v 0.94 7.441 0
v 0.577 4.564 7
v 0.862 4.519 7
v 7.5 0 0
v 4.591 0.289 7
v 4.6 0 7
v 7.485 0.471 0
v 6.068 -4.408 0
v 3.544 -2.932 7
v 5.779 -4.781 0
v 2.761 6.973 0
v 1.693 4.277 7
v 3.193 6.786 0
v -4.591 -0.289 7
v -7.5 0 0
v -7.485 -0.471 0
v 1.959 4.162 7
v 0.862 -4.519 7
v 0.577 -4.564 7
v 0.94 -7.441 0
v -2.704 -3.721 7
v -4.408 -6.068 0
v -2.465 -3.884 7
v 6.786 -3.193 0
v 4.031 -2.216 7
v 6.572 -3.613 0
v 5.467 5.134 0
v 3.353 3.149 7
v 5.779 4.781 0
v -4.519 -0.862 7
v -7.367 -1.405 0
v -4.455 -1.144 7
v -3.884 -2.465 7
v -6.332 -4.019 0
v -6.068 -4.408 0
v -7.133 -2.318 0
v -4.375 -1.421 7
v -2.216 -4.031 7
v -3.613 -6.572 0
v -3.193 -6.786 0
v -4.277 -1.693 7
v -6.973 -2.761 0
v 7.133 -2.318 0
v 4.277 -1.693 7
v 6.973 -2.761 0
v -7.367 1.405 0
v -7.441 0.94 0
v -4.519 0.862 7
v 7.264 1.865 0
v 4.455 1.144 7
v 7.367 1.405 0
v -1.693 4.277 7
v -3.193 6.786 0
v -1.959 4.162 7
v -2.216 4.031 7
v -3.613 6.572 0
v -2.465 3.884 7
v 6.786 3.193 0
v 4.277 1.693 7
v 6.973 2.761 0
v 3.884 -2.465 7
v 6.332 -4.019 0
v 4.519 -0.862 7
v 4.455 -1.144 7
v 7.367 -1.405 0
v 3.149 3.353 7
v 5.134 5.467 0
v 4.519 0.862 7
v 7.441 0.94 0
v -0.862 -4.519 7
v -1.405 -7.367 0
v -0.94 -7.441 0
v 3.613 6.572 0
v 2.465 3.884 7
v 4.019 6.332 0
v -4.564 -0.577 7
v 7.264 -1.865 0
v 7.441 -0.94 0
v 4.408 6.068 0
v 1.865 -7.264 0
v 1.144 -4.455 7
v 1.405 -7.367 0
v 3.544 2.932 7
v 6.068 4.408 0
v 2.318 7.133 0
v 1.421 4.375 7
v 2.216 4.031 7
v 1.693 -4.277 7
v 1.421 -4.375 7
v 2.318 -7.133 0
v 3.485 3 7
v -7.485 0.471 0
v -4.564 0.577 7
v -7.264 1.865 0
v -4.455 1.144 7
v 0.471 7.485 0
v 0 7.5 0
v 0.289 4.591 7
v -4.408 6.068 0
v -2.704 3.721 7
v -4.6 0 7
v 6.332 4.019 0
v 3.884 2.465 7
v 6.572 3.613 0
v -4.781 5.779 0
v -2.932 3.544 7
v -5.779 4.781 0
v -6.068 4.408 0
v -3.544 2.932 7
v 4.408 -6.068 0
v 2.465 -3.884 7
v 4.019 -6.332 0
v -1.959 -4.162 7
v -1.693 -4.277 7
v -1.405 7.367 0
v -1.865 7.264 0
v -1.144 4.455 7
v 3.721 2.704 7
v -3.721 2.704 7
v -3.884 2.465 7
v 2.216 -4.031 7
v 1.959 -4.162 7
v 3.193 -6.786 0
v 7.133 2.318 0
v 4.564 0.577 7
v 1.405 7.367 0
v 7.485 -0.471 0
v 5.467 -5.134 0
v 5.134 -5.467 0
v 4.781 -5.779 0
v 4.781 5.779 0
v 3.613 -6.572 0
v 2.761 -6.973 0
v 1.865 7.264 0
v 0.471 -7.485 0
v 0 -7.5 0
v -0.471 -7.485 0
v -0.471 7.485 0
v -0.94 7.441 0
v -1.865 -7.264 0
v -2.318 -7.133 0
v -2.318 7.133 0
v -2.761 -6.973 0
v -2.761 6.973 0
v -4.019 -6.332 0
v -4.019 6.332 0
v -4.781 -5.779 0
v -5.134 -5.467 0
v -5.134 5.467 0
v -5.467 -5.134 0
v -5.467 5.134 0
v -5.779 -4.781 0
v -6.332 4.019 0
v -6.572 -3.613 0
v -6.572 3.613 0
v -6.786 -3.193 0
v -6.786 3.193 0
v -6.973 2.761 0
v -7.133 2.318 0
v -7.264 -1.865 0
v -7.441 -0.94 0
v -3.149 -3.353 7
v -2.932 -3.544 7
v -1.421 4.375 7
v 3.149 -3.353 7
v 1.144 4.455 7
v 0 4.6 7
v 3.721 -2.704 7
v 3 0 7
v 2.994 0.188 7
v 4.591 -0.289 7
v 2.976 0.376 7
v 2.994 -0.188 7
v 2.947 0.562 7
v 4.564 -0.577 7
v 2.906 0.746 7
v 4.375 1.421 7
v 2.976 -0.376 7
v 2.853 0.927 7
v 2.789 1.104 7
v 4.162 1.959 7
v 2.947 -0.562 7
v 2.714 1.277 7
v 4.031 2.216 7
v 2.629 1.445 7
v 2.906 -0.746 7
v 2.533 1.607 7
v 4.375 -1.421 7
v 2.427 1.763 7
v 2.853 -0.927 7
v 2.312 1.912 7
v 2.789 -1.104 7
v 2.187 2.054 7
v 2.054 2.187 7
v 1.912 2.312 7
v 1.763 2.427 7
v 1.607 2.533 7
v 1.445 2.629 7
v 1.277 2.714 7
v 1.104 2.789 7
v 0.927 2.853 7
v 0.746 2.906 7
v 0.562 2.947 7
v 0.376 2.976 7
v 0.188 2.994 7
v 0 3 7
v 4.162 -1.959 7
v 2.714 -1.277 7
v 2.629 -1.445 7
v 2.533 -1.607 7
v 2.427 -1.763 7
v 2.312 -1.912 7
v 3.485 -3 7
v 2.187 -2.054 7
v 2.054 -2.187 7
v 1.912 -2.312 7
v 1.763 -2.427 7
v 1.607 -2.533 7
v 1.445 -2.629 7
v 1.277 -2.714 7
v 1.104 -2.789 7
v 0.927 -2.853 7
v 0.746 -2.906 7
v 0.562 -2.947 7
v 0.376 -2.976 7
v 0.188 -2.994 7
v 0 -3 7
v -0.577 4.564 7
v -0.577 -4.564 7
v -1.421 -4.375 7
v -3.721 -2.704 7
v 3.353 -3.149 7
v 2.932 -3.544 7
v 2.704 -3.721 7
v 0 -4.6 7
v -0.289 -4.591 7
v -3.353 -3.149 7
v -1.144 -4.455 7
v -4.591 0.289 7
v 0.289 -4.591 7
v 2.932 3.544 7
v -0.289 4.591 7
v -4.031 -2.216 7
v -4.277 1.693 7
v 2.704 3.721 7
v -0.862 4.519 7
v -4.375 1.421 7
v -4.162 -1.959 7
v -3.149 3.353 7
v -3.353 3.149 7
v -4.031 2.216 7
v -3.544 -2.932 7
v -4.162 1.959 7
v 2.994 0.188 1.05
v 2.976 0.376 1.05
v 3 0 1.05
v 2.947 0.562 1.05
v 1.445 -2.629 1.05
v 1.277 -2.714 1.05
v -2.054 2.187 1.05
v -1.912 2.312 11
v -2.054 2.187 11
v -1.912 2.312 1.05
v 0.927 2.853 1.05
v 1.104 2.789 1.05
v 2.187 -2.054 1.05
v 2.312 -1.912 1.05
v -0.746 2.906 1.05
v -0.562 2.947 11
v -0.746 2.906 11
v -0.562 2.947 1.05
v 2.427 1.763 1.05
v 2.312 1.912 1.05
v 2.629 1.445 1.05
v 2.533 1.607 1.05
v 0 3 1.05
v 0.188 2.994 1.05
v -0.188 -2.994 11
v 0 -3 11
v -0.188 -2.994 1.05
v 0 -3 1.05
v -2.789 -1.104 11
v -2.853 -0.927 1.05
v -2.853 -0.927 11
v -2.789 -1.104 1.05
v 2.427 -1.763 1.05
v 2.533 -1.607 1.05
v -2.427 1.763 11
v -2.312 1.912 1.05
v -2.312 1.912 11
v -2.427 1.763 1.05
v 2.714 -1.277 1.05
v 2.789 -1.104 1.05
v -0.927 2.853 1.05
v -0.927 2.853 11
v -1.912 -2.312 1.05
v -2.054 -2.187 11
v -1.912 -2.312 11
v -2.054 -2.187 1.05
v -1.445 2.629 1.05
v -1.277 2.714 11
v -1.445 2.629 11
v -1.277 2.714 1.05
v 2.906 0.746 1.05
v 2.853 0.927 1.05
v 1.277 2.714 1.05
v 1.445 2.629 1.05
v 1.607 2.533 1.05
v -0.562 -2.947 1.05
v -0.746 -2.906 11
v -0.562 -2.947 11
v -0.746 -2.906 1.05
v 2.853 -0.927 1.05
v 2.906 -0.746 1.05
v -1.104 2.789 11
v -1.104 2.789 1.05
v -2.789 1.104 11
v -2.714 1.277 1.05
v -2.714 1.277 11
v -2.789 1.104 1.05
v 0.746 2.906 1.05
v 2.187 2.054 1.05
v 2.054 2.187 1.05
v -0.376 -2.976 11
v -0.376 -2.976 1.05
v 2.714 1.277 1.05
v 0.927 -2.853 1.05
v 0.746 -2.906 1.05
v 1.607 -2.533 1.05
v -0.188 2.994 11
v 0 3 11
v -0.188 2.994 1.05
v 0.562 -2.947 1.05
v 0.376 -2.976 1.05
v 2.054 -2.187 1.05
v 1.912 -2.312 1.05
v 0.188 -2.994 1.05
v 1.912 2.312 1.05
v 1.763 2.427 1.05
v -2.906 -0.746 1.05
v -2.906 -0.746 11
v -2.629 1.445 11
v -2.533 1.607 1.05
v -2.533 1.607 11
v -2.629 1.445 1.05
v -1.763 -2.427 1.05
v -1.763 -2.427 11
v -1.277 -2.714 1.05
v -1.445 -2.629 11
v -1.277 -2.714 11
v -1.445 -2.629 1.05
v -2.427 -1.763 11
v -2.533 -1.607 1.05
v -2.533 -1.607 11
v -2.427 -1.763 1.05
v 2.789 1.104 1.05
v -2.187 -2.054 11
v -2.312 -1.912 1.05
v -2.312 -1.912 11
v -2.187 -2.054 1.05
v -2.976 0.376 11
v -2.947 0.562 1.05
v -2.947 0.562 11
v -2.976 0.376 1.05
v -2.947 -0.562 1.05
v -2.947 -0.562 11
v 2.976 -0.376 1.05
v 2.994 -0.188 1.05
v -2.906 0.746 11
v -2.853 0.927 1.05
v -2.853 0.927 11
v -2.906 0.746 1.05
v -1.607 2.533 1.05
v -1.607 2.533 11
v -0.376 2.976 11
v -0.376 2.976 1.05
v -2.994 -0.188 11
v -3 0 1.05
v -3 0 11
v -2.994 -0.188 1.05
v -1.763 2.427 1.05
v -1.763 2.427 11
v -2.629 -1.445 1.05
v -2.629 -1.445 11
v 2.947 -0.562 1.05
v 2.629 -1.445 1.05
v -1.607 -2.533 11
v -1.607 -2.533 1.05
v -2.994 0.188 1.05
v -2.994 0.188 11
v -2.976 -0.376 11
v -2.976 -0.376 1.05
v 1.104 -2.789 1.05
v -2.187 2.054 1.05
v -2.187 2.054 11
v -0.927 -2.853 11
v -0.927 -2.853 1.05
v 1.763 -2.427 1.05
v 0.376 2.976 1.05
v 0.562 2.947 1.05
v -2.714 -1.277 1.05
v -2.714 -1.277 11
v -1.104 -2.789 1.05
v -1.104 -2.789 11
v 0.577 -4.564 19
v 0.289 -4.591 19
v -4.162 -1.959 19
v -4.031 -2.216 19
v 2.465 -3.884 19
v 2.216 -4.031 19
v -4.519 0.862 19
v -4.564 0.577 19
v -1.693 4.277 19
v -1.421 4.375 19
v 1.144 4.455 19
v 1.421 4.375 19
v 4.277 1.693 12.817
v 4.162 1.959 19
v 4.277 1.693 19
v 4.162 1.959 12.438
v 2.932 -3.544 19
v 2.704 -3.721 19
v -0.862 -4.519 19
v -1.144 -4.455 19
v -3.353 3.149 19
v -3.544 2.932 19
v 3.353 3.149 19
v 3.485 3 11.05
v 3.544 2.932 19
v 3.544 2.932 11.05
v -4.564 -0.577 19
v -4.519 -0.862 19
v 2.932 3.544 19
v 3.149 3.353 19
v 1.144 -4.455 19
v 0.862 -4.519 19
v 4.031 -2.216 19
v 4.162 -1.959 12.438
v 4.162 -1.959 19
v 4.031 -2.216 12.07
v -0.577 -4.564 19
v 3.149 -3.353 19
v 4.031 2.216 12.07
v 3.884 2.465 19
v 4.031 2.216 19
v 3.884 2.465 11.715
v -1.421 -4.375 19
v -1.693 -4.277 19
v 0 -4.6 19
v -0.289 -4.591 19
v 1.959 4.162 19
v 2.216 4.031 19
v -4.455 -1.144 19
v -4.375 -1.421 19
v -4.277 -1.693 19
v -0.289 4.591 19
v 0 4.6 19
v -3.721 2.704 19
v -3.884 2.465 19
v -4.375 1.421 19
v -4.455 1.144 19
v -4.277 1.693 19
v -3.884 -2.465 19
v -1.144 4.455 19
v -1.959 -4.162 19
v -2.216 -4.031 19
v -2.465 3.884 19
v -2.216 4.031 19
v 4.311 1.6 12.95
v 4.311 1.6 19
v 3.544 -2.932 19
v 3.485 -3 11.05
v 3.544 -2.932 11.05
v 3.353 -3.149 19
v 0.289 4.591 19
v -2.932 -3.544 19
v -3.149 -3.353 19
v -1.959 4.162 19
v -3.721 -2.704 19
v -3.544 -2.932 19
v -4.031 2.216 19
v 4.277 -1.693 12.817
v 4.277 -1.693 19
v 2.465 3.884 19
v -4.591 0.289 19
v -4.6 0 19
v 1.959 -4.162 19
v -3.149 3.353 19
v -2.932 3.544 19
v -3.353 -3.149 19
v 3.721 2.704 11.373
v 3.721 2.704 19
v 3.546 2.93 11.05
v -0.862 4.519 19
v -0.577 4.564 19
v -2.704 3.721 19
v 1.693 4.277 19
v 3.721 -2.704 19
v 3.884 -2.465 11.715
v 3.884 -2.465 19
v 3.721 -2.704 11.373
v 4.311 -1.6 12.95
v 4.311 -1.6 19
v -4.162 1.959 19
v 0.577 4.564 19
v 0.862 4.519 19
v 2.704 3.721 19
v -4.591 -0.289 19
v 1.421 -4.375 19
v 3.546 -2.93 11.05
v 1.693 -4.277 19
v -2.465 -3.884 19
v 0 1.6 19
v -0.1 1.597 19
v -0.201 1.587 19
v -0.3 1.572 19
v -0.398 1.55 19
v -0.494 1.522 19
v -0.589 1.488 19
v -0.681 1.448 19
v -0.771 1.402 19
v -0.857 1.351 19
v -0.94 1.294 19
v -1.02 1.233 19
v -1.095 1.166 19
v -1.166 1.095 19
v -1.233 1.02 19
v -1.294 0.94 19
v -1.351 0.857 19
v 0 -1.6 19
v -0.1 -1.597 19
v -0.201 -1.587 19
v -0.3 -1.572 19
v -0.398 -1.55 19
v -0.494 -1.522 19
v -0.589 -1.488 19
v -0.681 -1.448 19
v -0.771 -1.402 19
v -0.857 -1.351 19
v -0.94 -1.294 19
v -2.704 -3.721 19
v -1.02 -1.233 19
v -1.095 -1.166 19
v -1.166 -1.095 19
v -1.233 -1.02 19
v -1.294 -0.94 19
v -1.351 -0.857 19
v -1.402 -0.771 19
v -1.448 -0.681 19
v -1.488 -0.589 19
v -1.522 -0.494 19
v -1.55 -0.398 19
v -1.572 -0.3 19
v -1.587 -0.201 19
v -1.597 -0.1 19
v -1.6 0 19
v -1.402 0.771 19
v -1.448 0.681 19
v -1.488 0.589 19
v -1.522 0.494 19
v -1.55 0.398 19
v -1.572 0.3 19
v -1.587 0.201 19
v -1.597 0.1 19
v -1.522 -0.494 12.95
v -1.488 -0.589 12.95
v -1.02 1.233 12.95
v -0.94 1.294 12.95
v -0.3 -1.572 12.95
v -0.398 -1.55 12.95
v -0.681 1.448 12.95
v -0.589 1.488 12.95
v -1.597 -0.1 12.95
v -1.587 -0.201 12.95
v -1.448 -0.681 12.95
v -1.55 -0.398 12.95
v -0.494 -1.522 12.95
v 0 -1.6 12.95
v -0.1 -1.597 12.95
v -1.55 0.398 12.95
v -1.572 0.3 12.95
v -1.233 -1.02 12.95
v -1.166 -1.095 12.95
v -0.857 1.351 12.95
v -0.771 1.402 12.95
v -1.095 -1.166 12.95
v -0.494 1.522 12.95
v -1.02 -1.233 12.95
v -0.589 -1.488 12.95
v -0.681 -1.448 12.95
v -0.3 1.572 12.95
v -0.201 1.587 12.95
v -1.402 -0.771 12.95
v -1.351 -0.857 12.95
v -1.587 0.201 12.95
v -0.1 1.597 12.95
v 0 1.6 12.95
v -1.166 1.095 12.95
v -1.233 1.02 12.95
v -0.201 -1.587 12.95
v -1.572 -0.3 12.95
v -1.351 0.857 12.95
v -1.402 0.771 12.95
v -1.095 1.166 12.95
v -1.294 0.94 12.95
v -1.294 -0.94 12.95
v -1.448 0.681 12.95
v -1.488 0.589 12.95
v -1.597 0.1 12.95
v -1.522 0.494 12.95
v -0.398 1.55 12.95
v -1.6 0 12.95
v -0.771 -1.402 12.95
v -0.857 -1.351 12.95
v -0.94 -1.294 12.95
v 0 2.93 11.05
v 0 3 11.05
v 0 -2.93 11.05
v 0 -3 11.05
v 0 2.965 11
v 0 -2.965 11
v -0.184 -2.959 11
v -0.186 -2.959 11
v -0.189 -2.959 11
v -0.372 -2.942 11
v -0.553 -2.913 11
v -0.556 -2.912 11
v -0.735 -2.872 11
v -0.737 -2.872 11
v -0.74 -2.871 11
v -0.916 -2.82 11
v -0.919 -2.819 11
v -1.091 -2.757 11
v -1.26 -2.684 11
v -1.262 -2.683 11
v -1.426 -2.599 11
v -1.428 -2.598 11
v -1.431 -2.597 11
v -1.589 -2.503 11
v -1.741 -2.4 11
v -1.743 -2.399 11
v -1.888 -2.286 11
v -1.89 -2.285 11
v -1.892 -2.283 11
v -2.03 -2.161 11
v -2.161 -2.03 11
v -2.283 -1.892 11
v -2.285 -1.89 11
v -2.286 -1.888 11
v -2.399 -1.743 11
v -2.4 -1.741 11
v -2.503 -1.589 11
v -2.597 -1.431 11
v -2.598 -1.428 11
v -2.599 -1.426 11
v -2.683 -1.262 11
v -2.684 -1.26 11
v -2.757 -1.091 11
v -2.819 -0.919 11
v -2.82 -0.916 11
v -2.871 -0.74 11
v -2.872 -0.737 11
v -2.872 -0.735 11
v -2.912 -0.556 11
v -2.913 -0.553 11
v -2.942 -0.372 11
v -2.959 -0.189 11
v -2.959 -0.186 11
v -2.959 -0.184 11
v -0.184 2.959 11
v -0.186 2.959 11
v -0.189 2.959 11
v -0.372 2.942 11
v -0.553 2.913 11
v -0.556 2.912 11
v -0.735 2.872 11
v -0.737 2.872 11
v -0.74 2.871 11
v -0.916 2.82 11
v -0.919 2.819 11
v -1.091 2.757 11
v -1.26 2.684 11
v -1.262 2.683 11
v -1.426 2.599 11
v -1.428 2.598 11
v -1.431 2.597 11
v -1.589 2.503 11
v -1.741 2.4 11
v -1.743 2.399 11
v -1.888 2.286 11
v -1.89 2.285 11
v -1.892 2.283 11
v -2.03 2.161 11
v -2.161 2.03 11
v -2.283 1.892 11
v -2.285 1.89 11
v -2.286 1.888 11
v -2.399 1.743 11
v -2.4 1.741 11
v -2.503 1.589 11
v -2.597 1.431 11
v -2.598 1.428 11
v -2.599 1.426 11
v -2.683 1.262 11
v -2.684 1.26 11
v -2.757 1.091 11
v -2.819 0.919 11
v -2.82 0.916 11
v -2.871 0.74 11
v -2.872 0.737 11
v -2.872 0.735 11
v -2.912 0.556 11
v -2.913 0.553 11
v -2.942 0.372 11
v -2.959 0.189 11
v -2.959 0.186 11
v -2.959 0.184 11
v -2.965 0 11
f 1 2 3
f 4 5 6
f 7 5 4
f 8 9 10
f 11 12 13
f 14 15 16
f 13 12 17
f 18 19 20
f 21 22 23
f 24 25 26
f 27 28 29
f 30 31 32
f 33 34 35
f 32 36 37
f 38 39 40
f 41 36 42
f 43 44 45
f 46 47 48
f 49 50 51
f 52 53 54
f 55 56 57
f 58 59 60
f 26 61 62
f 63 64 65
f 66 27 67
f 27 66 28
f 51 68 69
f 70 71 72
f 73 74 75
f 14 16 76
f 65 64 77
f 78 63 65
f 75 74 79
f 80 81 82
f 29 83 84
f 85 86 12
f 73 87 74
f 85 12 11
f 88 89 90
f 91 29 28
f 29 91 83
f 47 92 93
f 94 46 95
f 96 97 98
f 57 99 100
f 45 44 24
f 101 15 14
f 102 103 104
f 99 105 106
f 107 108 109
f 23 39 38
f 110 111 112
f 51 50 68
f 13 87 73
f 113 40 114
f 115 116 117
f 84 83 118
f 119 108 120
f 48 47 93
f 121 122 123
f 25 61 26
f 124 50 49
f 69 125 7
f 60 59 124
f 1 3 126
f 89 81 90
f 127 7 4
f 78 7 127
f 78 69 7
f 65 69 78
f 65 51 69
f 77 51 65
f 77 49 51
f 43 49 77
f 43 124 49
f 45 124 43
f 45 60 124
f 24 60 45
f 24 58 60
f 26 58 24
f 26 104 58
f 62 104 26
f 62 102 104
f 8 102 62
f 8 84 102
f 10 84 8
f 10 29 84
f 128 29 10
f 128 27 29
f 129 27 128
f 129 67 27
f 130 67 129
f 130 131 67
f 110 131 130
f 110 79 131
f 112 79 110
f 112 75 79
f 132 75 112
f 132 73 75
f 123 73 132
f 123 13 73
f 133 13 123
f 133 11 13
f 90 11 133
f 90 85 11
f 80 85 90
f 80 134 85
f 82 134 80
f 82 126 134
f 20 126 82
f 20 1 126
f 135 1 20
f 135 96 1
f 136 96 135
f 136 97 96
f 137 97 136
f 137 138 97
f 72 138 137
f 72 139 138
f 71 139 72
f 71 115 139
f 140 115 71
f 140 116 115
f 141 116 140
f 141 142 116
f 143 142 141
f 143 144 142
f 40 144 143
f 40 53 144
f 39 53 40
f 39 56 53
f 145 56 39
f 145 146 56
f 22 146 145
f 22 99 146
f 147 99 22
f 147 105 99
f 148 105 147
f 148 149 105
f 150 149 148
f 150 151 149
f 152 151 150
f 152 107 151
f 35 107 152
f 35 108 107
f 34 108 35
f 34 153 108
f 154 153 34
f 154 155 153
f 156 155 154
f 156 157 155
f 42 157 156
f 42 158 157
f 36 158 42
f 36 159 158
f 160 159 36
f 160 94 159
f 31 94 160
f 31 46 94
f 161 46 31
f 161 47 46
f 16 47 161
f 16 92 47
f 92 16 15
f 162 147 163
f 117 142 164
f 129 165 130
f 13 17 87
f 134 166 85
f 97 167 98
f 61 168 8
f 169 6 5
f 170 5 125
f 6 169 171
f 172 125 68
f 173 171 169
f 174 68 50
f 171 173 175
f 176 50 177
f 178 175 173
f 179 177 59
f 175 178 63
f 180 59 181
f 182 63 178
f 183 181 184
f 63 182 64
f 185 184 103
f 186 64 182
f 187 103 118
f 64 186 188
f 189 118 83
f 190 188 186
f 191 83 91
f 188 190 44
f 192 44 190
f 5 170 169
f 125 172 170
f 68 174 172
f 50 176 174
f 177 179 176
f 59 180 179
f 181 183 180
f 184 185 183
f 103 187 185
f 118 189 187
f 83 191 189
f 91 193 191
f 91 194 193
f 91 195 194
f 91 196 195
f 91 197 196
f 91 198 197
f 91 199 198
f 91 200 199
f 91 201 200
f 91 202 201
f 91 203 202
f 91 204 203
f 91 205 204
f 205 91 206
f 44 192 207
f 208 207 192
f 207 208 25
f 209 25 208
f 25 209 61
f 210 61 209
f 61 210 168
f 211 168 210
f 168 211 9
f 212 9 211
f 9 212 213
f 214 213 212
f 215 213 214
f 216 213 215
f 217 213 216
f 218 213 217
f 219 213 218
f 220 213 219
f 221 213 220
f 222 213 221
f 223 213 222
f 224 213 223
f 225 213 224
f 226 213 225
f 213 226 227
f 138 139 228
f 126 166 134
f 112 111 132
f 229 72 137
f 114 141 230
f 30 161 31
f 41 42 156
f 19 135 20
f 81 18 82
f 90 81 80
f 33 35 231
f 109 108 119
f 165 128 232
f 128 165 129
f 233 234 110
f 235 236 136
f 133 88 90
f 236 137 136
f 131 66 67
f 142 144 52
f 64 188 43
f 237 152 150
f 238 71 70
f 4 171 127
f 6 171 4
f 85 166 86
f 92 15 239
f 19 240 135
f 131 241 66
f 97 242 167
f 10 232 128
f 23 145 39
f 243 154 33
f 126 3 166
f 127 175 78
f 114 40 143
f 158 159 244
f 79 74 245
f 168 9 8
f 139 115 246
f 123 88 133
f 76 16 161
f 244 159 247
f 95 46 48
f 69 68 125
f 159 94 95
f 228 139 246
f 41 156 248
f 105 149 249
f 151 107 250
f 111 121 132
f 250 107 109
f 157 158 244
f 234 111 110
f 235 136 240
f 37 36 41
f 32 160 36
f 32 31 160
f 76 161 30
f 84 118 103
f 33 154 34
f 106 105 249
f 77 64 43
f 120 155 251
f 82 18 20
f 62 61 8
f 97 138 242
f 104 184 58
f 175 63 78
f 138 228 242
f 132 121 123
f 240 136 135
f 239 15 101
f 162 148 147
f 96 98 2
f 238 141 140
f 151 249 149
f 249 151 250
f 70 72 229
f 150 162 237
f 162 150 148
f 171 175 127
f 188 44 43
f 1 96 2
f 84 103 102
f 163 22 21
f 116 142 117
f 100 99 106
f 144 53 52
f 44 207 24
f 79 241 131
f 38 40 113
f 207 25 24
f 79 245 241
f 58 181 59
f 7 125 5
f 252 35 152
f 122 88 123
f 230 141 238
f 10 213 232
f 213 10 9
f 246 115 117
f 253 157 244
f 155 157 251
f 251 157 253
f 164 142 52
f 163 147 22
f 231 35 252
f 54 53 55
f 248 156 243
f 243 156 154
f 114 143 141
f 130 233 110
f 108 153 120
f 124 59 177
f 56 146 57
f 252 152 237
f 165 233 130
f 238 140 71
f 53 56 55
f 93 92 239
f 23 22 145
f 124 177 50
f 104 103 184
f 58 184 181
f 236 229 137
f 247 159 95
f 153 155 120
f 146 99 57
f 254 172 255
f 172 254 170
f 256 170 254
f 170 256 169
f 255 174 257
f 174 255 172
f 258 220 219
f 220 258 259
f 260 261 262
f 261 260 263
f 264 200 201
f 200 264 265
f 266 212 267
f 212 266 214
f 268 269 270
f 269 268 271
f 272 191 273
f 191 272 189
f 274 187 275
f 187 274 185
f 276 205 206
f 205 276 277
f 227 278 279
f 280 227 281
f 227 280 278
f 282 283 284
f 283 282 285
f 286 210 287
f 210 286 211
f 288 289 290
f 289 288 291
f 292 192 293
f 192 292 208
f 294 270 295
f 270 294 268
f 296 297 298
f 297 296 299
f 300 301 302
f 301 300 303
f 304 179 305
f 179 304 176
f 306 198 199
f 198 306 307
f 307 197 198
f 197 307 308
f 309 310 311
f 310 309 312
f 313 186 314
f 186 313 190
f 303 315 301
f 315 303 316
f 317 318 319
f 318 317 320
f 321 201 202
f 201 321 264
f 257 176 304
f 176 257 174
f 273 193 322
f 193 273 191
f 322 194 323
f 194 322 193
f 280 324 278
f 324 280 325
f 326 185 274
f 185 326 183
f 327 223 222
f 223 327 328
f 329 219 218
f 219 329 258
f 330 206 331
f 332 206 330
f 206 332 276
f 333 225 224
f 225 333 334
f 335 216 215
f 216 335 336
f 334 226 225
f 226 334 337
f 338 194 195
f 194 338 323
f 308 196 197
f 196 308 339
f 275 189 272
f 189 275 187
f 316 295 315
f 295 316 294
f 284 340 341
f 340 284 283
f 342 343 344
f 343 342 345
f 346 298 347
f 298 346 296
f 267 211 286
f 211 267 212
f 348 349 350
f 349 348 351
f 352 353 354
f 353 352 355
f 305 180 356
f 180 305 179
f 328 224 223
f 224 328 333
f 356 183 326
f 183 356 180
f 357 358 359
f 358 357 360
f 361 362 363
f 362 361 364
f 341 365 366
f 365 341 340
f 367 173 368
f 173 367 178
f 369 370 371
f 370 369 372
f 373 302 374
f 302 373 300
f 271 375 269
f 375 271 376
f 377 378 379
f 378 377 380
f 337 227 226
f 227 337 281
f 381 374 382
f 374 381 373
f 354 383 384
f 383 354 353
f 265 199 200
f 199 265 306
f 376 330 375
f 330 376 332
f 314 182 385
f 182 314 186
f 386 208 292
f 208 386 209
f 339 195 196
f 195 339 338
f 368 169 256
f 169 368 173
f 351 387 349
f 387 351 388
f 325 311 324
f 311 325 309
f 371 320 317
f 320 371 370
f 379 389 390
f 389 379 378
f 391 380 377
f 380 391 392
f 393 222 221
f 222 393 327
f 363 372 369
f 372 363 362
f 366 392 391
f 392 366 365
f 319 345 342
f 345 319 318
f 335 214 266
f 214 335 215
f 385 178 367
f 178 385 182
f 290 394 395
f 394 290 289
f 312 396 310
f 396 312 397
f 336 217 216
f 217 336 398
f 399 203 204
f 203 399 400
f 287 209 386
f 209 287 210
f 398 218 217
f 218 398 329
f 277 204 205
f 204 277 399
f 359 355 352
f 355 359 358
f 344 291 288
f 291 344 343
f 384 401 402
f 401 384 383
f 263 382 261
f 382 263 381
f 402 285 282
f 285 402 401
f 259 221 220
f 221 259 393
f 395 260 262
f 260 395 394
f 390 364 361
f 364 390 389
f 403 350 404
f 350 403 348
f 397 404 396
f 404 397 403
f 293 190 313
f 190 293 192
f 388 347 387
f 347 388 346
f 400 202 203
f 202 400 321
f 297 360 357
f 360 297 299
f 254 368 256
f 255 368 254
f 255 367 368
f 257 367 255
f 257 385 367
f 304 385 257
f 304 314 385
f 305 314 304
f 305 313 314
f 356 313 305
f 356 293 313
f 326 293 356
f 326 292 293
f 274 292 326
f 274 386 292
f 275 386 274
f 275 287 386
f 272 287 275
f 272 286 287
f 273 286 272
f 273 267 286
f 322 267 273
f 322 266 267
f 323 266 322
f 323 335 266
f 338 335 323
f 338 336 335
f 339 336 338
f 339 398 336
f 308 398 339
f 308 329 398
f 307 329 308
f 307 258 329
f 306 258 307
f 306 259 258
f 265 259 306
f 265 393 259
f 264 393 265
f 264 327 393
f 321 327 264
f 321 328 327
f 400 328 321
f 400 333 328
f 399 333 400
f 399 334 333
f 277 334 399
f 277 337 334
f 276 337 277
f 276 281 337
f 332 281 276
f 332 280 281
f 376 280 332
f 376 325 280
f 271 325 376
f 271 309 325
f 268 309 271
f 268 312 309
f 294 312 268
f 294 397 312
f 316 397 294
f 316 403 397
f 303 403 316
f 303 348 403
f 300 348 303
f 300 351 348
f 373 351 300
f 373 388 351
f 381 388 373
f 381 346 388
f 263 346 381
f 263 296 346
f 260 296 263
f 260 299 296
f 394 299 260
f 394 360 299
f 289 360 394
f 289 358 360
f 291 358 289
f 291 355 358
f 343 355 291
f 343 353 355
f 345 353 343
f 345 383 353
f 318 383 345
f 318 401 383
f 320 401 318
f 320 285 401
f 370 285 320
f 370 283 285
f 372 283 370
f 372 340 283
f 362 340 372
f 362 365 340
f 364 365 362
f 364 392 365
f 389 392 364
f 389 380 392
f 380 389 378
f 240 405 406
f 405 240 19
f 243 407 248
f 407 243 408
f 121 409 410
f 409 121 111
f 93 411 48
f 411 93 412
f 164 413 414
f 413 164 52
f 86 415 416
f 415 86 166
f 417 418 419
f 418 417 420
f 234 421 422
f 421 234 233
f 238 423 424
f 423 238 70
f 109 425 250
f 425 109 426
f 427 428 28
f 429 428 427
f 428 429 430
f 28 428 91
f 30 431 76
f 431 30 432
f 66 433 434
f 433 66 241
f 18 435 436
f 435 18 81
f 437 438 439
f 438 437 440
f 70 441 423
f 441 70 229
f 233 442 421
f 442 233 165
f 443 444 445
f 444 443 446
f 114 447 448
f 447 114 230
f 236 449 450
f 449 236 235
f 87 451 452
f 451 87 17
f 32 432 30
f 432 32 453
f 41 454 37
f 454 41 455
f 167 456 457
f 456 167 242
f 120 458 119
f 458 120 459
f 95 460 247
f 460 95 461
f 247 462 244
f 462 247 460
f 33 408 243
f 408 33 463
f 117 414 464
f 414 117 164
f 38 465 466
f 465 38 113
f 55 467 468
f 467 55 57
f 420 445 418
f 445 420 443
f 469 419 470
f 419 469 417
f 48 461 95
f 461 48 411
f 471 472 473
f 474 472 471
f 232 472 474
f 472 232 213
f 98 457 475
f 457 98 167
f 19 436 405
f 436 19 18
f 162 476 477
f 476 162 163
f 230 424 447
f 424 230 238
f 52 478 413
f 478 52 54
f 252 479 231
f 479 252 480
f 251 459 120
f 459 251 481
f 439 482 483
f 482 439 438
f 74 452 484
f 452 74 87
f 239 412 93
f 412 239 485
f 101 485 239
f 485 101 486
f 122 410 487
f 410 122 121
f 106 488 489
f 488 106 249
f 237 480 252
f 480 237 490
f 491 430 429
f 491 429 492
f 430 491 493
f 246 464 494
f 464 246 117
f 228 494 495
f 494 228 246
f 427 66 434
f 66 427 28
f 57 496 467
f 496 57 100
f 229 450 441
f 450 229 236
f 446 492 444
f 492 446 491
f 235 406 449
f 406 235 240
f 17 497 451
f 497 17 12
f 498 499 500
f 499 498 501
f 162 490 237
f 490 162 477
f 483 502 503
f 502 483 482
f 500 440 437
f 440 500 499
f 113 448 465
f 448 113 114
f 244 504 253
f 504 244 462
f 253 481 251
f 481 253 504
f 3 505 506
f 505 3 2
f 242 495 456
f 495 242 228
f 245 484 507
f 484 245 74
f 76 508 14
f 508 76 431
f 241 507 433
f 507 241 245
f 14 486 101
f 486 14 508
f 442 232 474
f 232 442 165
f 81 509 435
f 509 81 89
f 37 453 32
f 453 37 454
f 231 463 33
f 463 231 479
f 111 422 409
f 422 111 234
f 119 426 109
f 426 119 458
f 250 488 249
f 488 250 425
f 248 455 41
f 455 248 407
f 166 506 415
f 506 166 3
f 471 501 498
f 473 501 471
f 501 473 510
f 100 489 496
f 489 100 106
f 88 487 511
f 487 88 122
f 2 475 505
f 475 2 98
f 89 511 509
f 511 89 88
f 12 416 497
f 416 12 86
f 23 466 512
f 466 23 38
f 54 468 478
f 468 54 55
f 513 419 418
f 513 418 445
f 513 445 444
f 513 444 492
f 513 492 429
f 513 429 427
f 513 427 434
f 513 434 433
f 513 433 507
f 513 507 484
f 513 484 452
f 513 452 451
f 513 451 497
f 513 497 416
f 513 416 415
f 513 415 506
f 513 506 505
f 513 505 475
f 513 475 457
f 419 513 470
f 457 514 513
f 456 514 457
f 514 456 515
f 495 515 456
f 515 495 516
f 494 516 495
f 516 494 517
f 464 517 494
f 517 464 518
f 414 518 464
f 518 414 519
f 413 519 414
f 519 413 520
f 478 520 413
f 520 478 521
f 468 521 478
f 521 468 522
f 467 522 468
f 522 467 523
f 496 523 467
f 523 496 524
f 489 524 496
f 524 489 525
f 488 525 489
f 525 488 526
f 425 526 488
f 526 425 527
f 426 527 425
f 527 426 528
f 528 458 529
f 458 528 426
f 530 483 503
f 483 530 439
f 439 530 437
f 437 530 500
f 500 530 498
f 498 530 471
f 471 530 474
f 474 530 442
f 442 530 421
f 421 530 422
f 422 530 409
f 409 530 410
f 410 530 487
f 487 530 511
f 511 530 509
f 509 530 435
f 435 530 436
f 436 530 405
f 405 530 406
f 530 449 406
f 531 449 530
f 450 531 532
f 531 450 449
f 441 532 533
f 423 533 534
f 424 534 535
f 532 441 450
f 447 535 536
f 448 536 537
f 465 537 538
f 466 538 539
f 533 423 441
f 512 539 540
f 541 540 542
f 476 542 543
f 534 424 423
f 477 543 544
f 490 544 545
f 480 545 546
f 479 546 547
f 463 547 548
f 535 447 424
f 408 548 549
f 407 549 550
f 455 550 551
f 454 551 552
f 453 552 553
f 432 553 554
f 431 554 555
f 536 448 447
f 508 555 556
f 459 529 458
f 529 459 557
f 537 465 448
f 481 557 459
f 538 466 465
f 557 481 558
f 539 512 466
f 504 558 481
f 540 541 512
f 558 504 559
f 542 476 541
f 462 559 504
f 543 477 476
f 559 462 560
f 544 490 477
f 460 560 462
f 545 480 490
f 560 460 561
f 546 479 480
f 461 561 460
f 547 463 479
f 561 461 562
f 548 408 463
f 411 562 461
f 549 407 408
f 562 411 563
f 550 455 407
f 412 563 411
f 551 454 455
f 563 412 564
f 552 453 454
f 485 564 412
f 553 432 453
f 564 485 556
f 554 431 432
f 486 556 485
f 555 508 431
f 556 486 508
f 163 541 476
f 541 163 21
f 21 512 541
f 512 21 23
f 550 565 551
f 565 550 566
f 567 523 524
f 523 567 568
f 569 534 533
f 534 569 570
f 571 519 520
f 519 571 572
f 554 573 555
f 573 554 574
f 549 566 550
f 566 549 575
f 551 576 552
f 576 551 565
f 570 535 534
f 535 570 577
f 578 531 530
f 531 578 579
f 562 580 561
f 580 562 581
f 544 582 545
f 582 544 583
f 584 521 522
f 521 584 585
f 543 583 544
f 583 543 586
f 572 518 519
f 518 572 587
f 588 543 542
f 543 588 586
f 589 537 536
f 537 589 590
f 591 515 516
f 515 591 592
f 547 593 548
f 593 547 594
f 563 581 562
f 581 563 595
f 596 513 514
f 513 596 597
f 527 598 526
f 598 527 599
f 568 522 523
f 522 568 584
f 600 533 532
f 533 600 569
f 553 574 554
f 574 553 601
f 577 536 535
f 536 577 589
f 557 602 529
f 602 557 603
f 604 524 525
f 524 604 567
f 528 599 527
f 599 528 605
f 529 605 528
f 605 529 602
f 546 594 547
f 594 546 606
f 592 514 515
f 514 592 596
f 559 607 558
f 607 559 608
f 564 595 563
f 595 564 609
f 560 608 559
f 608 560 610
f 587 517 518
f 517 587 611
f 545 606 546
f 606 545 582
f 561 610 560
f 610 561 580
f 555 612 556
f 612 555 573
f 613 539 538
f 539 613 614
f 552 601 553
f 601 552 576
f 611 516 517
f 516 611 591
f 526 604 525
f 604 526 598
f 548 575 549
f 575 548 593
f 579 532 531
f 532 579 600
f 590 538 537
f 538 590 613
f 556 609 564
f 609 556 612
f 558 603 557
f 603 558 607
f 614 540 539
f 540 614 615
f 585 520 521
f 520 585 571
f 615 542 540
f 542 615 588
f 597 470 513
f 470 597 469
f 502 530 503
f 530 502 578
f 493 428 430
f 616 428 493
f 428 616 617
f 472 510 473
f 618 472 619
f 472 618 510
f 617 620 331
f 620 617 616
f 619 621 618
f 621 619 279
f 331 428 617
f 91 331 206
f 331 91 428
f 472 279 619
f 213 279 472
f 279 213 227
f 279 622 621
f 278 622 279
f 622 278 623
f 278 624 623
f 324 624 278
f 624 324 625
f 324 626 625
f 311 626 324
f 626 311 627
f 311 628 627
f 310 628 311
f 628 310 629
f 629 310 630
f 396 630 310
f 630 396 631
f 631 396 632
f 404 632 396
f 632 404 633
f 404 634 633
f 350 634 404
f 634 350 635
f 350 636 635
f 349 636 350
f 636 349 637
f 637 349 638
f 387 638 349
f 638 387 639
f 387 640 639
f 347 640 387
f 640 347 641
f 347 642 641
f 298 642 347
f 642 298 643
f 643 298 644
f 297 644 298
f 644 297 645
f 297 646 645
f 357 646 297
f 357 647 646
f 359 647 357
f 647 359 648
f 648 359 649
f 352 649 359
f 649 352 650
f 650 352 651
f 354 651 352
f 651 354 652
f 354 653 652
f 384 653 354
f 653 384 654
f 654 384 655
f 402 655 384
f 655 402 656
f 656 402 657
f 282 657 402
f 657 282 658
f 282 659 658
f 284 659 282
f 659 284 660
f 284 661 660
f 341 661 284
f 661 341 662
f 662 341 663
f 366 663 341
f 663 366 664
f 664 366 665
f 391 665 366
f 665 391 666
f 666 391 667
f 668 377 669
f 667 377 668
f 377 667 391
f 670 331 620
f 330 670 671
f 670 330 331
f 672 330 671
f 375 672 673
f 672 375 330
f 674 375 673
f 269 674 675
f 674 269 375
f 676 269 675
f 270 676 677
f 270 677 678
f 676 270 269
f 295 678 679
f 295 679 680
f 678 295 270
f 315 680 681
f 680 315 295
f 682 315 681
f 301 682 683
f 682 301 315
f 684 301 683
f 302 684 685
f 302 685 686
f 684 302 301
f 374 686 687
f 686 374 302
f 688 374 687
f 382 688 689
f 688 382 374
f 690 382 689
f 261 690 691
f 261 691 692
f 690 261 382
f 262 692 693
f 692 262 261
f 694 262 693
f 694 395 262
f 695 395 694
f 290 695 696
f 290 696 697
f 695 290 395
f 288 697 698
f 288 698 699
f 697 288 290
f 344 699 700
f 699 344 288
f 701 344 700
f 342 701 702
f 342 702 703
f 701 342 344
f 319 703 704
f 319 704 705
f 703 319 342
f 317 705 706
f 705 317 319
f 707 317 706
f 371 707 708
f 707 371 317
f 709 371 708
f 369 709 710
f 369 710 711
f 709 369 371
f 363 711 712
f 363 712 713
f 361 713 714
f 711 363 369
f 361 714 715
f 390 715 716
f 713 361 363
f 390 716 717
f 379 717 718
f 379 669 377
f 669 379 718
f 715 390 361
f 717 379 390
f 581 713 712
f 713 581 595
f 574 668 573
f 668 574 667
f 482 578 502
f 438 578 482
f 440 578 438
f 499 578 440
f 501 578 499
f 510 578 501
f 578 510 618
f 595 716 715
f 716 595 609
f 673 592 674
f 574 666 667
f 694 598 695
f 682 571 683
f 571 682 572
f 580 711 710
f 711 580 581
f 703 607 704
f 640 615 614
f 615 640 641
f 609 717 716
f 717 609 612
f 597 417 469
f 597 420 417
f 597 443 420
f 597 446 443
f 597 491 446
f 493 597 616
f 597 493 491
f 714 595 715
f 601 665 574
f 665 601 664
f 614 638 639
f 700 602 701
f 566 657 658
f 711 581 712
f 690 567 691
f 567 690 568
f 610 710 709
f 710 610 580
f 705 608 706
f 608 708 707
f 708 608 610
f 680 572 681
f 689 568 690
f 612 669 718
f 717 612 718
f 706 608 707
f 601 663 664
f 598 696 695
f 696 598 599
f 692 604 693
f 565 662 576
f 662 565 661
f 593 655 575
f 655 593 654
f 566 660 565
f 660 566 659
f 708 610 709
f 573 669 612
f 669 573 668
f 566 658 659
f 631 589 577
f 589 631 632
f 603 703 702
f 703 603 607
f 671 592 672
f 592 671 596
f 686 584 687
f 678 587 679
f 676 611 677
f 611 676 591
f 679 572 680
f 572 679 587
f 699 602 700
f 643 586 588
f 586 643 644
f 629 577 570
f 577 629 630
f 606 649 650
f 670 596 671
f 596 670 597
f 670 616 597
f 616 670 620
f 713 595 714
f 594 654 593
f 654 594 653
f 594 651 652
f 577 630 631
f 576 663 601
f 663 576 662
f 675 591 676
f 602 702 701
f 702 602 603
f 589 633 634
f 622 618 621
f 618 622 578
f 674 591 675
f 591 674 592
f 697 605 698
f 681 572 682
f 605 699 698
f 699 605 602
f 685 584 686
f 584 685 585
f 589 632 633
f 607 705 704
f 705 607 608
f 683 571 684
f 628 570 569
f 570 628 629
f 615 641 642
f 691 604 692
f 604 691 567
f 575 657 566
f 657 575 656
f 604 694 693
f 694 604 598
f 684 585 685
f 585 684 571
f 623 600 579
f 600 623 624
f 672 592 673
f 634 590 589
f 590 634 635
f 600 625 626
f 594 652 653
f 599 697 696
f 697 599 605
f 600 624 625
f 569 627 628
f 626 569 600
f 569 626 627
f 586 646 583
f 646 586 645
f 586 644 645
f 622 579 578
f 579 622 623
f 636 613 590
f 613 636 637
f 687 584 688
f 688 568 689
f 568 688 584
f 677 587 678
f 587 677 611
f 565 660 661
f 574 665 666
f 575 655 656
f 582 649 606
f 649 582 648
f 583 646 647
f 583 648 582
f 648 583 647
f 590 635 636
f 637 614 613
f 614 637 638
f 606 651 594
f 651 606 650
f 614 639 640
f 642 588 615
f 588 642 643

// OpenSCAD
tete_diam_ext=15;
tete_diam_int=6;
tete_hauteur=7;

corps_diam_int=3.2;
corps_hauteur=12;
corps_epaisseur=3;

encoche_hauteur=4.0;

epaisseur=1;

artefact=0.05;
module tete() {
    difference() {
        cylinder(h=tete_hauteur,d1=tete_diam_ext,d2=corps_diam_int+2*corps_epaisseur,$fn=100);
        hauteur_interieur=tete_hauteur-epaisseur+artefact;
        translate([0,0,epaisseur+artefact])
            cylinder(h=hauteur_interieur,d=tete_diam_int,$fn=100);
    }
}

module corps(){
    corps_diam_ext=corps_diam_int+2*corps_epaisseur;
    tete_encoche=tete_diam_int;
    corps_encoche=corps_diam_int;
    difference(){
        difference(){ //corps
            cylinder(h=corps_hauteur,d=corps_diam_ext,$fn=100);
            translate([0,0,-artefact])
                cylinder(h=corps_hauteur+2*artefact,d=corps_diam_int,$fn=100);
        }
        translate([corps_encoche,0,corps_hauteur/2+artefact]) //encoche corps vis
            cube([2*corps_encoche,corps_encoche,corps_hauteur+2*artefact],center=true);
        translate([tete_encoche,0,encoche_hauteur/2]) //encoche tete vis
            cube([2*tete_encoche,tete_encoche,encoche_hauteur+2*artefact],center=true);
        translate([0,0,-artefact]) //Trou pour la tete
            cylinder(h=encoche_hauteur+artefact,d=tete_diam_int,$fn=100);
        hull() { //Chanfrein
            translate([0,0,encoche_hauteur/2+2-artefact])
                cylinder(h=2,d1=tete_diam_int,d2=corps_diam_int,$fn=100);
            diam1=2*sqrt((tete_encoche*tete_encoche)/2);
            diam2=2*sqrt((corps_diam_int*corps_diam_int)/2);
            translate([diam2,0,encoche_hauteur/2+2-artefact]) rotate([0,0,45]) 
                cylinder(h=2,d1=diam1,d2=diam2,$fn=4);
        }
    }
}

tete();

translate([0,0,tete_hauteur])
    corps();
